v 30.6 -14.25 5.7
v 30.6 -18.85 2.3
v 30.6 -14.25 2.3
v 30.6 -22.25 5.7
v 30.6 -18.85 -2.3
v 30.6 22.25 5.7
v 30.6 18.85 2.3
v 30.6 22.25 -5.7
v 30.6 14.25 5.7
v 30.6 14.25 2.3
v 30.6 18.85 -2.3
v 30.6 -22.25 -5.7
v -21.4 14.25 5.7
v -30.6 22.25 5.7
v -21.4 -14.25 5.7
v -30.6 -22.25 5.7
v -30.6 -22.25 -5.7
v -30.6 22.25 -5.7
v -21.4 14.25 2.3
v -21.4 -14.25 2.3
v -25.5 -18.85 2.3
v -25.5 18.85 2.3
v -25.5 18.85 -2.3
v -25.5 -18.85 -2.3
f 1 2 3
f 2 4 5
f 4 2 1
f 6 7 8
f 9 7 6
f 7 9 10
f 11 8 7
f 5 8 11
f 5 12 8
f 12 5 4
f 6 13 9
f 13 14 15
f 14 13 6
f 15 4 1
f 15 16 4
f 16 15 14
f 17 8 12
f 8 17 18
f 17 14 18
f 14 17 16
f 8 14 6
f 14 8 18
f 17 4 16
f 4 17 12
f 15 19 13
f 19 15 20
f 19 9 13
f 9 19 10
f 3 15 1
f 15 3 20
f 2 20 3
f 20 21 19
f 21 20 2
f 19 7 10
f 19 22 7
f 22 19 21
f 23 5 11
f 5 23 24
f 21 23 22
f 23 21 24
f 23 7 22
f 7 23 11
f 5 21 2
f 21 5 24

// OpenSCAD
// file: BOSL2/std.scad
// Minimal BOSL2 compatibility shim for bundled gallery models.
// It implements only the helpers used by the imported OpenSCAD projects.

CENTER = [0, 0, 0];
BOTTOM = [0, 0, -1];
TOP = [0, 0, 1];
LEFT = [-1, 0, 0];
RIGHT = [1, 0, 0];
FRONT = [0, -1, 0];
BACK = [0, 1, 0];

module up(z=0) {
    translate([0, 0, z]) children();
}

module down(z=0) {
    translate([0, 0, -z]) children();
}

module attach(anchor=CENTER) {
    children();
}

module cuboid(size=[1, 1, 1], anchor=CENTER) {
    center = anchor == CENTER;
    translate(center ? [0, 0, 0] : [0, 0, size[2] / 2])
        cube(size, center=true);
    children();
}

module xcyl(h=1, r=1, anchor=CENTER) {
    center = anchor == CENTER;
    translate(center ? [0, 0, 0] : [h / 2, 0, 0])
        rotate([0, 90, 0])
            cylinder(h=h, r=r, center=true);
}
// main file
include <BOSL2/std.scad>
$fn=80;

thickness = 3.4;

outer_width = 61.2;
outer_depth = 44.5;
outer_height = 11.4;
outer_radius = 10;

inner_width = 52;
inner_depth = 28.5;
inner_height = outer_height - thickness;
inner_radius = 7;

cut_width = outer_width - thickness;
cut_depth = outer_depth - 2*thickness;
cut_height = outer_height - 2*thickness;
cut_radius = outer_radius-thickness;

difference() {
    cuboid([outer_width,outer_depth,outer_height],
        rounding=outer_radius,edges=[FRONT+LEFT,BACK+LEFT]);
    
    translate([(outer_width-inner_width)/2,0,thickness])    
            cuboid([inner_width,inner_depth,inner_height],
                rounding=inner_radius,edges=[FRONT+LEFT,BACK+LEFT]);

    translate([thickness,0,0])
        cuboid([cut_width,cut_depth,cut_height],
           rounding=cut_radius,edges=[FRONT+LEFT,BACK+LEFT]);
}
